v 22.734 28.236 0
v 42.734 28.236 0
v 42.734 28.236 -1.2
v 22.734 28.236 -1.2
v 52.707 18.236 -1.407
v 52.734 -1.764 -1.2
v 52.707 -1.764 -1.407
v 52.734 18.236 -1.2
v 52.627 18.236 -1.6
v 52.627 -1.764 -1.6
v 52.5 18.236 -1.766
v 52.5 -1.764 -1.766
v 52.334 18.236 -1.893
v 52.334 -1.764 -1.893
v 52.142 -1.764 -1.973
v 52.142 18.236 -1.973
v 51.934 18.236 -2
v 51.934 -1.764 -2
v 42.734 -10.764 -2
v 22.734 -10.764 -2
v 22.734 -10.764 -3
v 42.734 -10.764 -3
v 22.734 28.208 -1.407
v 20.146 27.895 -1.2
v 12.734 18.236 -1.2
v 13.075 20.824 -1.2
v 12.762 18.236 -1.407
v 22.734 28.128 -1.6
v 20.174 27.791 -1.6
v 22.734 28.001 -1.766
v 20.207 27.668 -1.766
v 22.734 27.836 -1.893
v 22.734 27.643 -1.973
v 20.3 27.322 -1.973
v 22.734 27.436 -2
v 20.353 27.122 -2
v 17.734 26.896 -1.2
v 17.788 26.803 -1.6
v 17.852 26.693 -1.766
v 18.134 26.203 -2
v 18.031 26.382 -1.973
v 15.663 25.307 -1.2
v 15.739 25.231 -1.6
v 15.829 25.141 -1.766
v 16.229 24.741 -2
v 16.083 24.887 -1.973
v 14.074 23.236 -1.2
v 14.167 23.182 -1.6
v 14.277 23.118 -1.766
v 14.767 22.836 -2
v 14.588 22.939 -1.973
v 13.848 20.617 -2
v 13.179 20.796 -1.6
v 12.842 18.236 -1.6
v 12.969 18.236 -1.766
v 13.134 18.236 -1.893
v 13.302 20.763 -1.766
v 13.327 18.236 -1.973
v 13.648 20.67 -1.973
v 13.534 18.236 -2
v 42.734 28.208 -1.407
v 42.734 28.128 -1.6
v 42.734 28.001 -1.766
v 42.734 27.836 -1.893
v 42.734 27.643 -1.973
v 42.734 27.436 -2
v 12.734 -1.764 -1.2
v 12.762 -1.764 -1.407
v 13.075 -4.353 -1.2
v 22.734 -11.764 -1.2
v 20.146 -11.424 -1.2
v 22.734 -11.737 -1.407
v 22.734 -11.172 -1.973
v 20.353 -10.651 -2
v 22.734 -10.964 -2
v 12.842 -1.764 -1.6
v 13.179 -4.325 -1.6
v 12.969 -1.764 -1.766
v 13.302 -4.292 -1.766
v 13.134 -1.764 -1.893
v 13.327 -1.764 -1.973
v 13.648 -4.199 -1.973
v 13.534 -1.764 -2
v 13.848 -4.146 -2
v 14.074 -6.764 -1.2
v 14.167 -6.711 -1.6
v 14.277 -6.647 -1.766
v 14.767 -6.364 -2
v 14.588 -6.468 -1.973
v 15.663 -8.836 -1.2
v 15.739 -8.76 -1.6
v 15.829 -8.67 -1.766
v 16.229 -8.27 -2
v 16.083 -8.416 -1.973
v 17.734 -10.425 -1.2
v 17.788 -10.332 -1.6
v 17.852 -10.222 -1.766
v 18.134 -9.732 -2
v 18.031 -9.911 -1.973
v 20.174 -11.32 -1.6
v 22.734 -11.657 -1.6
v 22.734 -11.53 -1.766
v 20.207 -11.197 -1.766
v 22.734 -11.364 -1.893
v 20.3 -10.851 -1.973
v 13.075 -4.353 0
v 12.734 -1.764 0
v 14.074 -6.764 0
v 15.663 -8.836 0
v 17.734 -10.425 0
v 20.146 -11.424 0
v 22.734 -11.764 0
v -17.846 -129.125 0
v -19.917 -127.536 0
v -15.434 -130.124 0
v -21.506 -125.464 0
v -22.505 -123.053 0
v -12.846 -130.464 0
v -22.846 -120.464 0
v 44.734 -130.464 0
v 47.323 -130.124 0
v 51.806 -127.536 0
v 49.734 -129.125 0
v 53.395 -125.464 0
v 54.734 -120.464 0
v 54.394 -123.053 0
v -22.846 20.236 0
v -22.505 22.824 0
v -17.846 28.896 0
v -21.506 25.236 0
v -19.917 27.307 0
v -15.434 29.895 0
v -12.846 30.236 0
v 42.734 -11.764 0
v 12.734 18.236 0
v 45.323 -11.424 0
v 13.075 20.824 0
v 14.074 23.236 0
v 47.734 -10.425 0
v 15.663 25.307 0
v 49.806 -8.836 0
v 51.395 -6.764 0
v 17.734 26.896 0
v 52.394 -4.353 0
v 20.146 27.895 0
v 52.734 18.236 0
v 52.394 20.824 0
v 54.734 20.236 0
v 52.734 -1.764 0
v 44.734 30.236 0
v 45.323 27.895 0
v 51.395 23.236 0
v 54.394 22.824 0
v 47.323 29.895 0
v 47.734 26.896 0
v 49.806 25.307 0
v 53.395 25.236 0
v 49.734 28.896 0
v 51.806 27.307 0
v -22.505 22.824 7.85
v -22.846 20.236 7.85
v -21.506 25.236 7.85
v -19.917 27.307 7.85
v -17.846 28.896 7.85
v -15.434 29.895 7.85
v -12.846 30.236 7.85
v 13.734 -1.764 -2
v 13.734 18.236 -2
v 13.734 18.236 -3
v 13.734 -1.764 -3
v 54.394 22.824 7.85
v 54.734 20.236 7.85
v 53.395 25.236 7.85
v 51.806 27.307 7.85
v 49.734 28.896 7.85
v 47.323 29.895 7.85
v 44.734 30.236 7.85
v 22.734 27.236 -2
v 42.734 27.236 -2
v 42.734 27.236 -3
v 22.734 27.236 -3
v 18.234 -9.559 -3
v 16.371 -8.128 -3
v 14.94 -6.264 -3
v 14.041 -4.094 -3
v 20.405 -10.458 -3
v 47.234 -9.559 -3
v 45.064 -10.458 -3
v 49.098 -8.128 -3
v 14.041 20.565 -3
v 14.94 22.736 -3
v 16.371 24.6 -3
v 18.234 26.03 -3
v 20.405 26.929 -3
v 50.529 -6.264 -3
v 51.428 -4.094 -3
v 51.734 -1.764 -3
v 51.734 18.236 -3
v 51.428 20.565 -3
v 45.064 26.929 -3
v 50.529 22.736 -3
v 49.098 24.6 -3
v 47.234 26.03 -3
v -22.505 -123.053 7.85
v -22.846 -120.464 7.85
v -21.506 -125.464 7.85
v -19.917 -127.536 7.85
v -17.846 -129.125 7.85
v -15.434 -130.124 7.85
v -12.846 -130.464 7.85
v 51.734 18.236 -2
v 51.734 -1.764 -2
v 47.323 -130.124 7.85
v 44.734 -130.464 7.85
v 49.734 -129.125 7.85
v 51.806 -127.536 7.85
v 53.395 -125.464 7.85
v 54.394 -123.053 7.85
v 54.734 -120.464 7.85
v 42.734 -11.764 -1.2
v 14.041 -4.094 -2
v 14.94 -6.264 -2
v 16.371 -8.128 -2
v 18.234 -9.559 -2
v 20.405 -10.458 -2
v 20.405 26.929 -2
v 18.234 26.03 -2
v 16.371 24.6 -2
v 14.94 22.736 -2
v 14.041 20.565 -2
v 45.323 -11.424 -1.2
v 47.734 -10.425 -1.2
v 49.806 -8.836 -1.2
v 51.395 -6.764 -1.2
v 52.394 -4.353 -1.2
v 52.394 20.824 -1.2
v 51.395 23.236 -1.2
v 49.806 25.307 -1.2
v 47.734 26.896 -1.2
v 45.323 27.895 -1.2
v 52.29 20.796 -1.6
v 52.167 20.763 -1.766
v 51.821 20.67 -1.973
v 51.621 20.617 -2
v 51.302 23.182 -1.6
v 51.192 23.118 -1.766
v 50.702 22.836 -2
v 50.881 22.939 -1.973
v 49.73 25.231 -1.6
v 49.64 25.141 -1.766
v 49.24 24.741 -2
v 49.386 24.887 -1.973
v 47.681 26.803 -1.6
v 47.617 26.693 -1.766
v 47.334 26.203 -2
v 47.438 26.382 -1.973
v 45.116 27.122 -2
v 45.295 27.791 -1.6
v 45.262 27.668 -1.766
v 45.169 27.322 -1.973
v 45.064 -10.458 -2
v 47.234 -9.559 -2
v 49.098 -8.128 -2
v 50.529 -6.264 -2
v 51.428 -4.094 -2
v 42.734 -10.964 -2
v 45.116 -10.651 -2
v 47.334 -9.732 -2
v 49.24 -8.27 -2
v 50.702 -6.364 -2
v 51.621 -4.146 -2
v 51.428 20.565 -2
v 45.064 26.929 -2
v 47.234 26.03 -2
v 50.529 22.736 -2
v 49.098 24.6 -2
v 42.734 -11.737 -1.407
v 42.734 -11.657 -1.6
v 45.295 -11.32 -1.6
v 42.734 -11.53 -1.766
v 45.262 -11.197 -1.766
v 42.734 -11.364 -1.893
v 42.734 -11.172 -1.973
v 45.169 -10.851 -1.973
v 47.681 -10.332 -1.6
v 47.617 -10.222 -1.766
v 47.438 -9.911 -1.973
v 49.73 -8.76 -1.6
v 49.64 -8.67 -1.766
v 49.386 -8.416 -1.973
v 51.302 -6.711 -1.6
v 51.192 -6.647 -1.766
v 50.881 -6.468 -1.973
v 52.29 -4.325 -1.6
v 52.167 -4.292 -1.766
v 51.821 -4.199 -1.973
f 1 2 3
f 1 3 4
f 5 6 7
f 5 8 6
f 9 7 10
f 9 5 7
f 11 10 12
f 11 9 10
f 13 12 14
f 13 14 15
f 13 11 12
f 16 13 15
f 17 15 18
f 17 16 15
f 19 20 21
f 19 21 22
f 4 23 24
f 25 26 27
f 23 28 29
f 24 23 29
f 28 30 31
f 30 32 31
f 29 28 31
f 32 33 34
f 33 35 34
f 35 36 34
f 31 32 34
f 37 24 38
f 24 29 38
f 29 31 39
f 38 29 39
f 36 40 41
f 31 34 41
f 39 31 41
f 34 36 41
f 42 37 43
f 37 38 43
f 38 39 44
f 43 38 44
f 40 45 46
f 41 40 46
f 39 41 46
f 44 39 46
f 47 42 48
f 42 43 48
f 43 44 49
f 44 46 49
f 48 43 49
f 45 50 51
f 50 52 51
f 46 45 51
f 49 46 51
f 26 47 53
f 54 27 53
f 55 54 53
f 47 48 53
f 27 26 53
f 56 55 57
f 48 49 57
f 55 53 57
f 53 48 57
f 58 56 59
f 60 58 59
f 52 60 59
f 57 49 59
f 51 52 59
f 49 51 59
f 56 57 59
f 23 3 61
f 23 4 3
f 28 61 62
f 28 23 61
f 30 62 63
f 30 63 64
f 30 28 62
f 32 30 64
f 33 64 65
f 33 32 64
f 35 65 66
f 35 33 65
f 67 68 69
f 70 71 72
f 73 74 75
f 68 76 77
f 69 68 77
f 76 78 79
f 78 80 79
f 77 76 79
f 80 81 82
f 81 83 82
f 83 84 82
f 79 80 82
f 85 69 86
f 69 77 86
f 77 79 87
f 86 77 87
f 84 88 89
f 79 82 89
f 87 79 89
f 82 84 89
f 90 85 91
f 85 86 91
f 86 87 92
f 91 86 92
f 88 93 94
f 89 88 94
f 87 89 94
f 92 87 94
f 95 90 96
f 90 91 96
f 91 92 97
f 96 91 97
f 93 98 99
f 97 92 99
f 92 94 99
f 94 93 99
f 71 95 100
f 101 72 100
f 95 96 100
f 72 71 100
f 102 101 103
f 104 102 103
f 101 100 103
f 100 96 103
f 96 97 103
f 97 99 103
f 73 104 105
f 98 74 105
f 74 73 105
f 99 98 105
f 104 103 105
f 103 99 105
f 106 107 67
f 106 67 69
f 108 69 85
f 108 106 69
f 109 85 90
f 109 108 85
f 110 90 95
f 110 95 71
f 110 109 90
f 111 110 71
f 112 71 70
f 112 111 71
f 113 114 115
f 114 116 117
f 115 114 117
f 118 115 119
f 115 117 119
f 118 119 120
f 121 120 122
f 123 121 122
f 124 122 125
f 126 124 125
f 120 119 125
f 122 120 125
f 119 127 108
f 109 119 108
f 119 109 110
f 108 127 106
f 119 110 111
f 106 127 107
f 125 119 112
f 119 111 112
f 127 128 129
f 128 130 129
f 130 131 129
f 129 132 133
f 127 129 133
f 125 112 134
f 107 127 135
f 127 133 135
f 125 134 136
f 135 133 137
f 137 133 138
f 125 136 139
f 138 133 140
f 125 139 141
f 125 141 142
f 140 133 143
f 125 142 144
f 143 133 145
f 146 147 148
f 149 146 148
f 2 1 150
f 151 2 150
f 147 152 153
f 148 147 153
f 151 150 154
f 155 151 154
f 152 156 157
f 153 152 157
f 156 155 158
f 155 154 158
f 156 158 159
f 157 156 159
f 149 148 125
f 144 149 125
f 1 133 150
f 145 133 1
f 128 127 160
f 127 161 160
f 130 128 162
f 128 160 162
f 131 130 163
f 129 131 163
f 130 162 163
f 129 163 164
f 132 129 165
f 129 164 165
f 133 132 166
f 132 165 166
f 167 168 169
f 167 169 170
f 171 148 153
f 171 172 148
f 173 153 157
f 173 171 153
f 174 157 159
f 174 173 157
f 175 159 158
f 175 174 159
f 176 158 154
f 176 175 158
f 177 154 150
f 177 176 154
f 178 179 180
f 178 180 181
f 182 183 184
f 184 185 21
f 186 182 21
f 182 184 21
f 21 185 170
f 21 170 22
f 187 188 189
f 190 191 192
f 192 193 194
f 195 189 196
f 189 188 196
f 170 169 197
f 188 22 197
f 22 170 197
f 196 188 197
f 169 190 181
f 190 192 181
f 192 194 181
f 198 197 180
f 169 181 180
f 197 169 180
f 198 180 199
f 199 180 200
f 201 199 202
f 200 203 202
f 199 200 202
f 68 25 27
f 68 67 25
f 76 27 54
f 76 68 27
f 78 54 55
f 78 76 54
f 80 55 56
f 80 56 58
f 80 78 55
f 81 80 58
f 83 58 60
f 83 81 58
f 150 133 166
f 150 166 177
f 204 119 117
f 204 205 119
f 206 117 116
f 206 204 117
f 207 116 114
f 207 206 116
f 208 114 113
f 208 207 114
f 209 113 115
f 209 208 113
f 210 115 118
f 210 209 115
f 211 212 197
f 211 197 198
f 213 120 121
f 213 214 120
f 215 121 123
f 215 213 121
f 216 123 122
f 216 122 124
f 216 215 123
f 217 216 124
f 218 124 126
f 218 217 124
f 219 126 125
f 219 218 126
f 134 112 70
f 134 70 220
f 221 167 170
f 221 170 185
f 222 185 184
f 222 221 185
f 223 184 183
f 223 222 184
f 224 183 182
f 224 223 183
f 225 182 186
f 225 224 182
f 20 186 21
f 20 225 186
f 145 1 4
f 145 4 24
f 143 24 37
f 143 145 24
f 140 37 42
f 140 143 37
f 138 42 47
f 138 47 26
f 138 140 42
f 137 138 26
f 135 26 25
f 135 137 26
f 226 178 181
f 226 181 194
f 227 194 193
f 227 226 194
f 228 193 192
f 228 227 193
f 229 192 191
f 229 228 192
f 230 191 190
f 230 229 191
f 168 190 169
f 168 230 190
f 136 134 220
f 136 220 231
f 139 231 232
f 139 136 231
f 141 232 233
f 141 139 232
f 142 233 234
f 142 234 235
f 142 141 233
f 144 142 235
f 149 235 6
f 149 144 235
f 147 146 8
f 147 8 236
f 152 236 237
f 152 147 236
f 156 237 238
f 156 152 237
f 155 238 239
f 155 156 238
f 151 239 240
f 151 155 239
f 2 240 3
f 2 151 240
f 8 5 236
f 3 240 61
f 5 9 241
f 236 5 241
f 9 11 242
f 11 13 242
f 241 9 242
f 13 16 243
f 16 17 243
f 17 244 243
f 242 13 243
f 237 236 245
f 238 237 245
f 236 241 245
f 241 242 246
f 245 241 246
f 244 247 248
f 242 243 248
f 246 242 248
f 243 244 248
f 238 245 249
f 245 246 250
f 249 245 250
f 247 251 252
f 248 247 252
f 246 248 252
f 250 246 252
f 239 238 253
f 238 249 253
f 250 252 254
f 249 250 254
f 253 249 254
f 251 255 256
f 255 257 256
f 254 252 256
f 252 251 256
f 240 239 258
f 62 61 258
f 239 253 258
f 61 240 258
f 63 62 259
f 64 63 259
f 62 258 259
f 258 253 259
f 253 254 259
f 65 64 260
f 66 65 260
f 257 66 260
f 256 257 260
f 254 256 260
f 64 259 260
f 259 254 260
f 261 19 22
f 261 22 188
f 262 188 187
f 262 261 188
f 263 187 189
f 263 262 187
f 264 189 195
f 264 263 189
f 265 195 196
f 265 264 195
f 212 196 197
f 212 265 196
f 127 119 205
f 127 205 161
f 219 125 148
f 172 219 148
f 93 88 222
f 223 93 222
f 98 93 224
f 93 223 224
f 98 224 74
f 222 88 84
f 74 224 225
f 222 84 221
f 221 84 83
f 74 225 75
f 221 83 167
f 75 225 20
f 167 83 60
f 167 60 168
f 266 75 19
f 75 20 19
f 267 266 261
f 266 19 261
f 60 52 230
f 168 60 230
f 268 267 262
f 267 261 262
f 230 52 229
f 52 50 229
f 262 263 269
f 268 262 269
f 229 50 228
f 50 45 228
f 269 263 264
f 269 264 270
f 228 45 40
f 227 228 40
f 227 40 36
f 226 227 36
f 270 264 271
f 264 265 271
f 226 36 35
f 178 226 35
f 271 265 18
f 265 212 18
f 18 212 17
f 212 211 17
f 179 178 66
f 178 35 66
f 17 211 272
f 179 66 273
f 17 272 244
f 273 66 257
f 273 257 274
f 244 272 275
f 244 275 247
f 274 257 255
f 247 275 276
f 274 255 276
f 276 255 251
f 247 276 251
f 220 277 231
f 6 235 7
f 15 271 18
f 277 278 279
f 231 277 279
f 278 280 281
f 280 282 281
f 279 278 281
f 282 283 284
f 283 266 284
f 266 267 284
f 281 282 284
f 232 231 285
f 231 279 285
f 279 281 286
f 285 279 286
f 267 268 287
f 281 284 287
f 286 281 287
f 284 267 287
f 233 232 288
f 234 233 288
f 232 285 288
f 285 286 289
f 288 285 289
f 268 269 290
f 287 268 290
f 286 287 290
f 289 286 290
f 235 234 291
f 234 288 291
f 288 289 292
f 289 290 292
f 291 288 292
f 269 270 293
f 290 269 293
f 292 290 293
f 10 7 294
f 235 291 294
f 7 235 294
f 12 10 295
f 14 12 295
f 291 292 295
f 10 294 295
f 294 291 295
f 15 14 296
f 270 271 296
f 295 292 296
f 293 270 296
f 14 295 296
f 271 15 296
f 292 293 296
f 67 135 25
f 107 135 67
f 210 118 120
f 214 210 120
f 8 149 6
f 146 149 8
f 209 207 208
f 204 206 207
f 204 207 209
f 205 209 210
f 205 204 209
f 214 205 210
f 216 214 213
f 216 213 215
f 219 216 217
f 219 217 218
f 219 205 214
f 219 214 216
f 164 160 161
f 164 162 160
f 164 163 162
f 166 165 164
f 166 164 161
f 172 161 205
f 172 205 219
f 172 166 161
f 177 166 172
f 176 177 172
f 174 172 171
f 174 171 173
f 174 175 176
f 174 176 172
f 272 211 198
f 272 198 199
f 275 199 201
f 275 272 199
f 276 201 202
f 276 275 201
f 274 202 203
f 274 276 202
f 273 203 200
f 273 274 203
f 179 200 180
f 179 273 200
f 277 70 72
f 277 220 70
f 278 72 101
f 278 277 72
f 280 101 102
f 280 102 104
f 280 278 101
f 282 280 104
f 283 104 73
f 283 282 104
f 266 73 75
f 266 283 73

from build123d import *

# Parameters (mm, degrees)
IZIM1_W                     = 77.58
IZIM1_H                     = 160.7
Y_KSEKLIK_EKSTR_ZYON1_DEPTH = 7.85
RADYUS1_R                   = 10
Y_KSEKLIK_EKSTR_ZYON2_DEPTH = 2
Y_KSEKLIK_EKSTR_ZYON3_DEPTH = 1
RADYUS3_R                   = 0.8


with BuildPart() as part:
    # Çizim1 → Yükseklik-Ekstrüzyon1 (new body)
    with BuildSketch(Plane.XY):
        with Locations((15.94448574, -50.114448669)):
            Rectangle(IZIM1_W, IZIM1_H)
    extrude(amount=Y_KSEKLIK_EKSTR_ZYON1_DEPTH)

    # Radyus1
    radyus1_edges = [part.edges().sort_by_distance(p)[0] for p in [
        (-22.84551426, 30.235551331, 3.925),
        (54.73448574, 30.235551331, 3.925),
        (54.73448574, -130.464448669, 3.925),
        (-22.84551426, -130.464448669, 3.925),
    ]]
    fillet(radyus1_edges, radius=RADYUS1_R)

    # Çizim3 → Yükseklik-Ekstrüzyon2 (add)
    with BuildSketch(Plane(origin=(0, 0, 0), x_dir=(-1, 0, 0), z_dir=(0, 0, -1))):
        with BuildLine():
            Line((-42.73448574, 28.235551331), (-22.73448574, 28.235551331))
            ThreePointArc((-22.73448574, 28.235551331), (-15.663417928, 25.306619143), (-12.73448574, 18.235551331))
            Line((-12.73448574, 18.235551331), (-12.73448574, -1.764448669))
            ThreePointArc((-12.73448574, -1.764448669), (-15.663417928, -8.835516481), (-22.73448574, -11.764448669))
            Line((-22.73448574, -11.764448669), (-42.73448574, -11.764448669))
            ThreePointArc((-42.73448574, -11.764448669), (-49.805553552, -8.835516481), (-52.73448574, -1.764448669))
            Line((-52.73448574, -1.764448669), (-52.73448574, 18.235551331))
            ThreePointArc((-52.73448574, 18.235551331), (-49.805553552, 25.306619143), (-42.73448574, 28.235551331))
        make_face()
    extrude(amount=Y_KSEKLIK_EKSTR_ZYON2_DEPTH)

    # Çizim7 → Yükseklik-Ekstrüzyon3 (add)
    with BuildSketch(Plane(origin=(0, 0, -2), x_dir=(-1, 0, 0), z_dir=(0, 0, -1))):
        with BuildLine():
            Line((-42.73448574, 27.235551331), (-22.73448574, 27.235551331))
            ThreePointArc((-22.73448574, 27.235551331), (-16.370524709, 24.599512361), (-13.73448574, 18.235551331))
            Line((-13.73448574, 18.235551331), (-13.73448574, -1.764448669))
            ThreePointArc((-13.73448574, -1.764448669), (-16.370524709, -8.1284097), (-22.73448574, -10.764448669))
            Line((-22.73448574, -10.764448669), (-42.73448574, -10.764448669))
            ThreePointArc((-42.73448574, -10.764448669), (-49.098446771, -8.1284097), (-51.73448574, -1.764448669))
            Line((-51.73448574, -1.764448669), (-51.73448574, 18.235551331))
            ThreePointArc((-51.73448574, 18.235551331), (-49.098446771, 24.599512361), (-42.73448574, 27.235551331))
        make_face()
    extrude(amount=Y_KSEKLIK_EKSTR_ZYON3_DEPTH)

    # Radyus3
    radyus3_edges = [part.edges().sort_by_distance(p)[0] for p in [
        (49.805553552, 25.306619143, -2),
        (52.73448574, 8.235551331, -2),
        (49.805553552, -8.835516481, -2),
        (32.73448574, -11.764448669, -2),
        (15.663417928, -8.835516481, -2),
        (12.73448574, 8.235551331, -2),
        (15.663417928, 25.306619143, -2),
        (32.73448574, 28.235551331, -2),
    ]]
    fillet(radyus3_edges, radius=RADYUS3_R)


solid = part.part
